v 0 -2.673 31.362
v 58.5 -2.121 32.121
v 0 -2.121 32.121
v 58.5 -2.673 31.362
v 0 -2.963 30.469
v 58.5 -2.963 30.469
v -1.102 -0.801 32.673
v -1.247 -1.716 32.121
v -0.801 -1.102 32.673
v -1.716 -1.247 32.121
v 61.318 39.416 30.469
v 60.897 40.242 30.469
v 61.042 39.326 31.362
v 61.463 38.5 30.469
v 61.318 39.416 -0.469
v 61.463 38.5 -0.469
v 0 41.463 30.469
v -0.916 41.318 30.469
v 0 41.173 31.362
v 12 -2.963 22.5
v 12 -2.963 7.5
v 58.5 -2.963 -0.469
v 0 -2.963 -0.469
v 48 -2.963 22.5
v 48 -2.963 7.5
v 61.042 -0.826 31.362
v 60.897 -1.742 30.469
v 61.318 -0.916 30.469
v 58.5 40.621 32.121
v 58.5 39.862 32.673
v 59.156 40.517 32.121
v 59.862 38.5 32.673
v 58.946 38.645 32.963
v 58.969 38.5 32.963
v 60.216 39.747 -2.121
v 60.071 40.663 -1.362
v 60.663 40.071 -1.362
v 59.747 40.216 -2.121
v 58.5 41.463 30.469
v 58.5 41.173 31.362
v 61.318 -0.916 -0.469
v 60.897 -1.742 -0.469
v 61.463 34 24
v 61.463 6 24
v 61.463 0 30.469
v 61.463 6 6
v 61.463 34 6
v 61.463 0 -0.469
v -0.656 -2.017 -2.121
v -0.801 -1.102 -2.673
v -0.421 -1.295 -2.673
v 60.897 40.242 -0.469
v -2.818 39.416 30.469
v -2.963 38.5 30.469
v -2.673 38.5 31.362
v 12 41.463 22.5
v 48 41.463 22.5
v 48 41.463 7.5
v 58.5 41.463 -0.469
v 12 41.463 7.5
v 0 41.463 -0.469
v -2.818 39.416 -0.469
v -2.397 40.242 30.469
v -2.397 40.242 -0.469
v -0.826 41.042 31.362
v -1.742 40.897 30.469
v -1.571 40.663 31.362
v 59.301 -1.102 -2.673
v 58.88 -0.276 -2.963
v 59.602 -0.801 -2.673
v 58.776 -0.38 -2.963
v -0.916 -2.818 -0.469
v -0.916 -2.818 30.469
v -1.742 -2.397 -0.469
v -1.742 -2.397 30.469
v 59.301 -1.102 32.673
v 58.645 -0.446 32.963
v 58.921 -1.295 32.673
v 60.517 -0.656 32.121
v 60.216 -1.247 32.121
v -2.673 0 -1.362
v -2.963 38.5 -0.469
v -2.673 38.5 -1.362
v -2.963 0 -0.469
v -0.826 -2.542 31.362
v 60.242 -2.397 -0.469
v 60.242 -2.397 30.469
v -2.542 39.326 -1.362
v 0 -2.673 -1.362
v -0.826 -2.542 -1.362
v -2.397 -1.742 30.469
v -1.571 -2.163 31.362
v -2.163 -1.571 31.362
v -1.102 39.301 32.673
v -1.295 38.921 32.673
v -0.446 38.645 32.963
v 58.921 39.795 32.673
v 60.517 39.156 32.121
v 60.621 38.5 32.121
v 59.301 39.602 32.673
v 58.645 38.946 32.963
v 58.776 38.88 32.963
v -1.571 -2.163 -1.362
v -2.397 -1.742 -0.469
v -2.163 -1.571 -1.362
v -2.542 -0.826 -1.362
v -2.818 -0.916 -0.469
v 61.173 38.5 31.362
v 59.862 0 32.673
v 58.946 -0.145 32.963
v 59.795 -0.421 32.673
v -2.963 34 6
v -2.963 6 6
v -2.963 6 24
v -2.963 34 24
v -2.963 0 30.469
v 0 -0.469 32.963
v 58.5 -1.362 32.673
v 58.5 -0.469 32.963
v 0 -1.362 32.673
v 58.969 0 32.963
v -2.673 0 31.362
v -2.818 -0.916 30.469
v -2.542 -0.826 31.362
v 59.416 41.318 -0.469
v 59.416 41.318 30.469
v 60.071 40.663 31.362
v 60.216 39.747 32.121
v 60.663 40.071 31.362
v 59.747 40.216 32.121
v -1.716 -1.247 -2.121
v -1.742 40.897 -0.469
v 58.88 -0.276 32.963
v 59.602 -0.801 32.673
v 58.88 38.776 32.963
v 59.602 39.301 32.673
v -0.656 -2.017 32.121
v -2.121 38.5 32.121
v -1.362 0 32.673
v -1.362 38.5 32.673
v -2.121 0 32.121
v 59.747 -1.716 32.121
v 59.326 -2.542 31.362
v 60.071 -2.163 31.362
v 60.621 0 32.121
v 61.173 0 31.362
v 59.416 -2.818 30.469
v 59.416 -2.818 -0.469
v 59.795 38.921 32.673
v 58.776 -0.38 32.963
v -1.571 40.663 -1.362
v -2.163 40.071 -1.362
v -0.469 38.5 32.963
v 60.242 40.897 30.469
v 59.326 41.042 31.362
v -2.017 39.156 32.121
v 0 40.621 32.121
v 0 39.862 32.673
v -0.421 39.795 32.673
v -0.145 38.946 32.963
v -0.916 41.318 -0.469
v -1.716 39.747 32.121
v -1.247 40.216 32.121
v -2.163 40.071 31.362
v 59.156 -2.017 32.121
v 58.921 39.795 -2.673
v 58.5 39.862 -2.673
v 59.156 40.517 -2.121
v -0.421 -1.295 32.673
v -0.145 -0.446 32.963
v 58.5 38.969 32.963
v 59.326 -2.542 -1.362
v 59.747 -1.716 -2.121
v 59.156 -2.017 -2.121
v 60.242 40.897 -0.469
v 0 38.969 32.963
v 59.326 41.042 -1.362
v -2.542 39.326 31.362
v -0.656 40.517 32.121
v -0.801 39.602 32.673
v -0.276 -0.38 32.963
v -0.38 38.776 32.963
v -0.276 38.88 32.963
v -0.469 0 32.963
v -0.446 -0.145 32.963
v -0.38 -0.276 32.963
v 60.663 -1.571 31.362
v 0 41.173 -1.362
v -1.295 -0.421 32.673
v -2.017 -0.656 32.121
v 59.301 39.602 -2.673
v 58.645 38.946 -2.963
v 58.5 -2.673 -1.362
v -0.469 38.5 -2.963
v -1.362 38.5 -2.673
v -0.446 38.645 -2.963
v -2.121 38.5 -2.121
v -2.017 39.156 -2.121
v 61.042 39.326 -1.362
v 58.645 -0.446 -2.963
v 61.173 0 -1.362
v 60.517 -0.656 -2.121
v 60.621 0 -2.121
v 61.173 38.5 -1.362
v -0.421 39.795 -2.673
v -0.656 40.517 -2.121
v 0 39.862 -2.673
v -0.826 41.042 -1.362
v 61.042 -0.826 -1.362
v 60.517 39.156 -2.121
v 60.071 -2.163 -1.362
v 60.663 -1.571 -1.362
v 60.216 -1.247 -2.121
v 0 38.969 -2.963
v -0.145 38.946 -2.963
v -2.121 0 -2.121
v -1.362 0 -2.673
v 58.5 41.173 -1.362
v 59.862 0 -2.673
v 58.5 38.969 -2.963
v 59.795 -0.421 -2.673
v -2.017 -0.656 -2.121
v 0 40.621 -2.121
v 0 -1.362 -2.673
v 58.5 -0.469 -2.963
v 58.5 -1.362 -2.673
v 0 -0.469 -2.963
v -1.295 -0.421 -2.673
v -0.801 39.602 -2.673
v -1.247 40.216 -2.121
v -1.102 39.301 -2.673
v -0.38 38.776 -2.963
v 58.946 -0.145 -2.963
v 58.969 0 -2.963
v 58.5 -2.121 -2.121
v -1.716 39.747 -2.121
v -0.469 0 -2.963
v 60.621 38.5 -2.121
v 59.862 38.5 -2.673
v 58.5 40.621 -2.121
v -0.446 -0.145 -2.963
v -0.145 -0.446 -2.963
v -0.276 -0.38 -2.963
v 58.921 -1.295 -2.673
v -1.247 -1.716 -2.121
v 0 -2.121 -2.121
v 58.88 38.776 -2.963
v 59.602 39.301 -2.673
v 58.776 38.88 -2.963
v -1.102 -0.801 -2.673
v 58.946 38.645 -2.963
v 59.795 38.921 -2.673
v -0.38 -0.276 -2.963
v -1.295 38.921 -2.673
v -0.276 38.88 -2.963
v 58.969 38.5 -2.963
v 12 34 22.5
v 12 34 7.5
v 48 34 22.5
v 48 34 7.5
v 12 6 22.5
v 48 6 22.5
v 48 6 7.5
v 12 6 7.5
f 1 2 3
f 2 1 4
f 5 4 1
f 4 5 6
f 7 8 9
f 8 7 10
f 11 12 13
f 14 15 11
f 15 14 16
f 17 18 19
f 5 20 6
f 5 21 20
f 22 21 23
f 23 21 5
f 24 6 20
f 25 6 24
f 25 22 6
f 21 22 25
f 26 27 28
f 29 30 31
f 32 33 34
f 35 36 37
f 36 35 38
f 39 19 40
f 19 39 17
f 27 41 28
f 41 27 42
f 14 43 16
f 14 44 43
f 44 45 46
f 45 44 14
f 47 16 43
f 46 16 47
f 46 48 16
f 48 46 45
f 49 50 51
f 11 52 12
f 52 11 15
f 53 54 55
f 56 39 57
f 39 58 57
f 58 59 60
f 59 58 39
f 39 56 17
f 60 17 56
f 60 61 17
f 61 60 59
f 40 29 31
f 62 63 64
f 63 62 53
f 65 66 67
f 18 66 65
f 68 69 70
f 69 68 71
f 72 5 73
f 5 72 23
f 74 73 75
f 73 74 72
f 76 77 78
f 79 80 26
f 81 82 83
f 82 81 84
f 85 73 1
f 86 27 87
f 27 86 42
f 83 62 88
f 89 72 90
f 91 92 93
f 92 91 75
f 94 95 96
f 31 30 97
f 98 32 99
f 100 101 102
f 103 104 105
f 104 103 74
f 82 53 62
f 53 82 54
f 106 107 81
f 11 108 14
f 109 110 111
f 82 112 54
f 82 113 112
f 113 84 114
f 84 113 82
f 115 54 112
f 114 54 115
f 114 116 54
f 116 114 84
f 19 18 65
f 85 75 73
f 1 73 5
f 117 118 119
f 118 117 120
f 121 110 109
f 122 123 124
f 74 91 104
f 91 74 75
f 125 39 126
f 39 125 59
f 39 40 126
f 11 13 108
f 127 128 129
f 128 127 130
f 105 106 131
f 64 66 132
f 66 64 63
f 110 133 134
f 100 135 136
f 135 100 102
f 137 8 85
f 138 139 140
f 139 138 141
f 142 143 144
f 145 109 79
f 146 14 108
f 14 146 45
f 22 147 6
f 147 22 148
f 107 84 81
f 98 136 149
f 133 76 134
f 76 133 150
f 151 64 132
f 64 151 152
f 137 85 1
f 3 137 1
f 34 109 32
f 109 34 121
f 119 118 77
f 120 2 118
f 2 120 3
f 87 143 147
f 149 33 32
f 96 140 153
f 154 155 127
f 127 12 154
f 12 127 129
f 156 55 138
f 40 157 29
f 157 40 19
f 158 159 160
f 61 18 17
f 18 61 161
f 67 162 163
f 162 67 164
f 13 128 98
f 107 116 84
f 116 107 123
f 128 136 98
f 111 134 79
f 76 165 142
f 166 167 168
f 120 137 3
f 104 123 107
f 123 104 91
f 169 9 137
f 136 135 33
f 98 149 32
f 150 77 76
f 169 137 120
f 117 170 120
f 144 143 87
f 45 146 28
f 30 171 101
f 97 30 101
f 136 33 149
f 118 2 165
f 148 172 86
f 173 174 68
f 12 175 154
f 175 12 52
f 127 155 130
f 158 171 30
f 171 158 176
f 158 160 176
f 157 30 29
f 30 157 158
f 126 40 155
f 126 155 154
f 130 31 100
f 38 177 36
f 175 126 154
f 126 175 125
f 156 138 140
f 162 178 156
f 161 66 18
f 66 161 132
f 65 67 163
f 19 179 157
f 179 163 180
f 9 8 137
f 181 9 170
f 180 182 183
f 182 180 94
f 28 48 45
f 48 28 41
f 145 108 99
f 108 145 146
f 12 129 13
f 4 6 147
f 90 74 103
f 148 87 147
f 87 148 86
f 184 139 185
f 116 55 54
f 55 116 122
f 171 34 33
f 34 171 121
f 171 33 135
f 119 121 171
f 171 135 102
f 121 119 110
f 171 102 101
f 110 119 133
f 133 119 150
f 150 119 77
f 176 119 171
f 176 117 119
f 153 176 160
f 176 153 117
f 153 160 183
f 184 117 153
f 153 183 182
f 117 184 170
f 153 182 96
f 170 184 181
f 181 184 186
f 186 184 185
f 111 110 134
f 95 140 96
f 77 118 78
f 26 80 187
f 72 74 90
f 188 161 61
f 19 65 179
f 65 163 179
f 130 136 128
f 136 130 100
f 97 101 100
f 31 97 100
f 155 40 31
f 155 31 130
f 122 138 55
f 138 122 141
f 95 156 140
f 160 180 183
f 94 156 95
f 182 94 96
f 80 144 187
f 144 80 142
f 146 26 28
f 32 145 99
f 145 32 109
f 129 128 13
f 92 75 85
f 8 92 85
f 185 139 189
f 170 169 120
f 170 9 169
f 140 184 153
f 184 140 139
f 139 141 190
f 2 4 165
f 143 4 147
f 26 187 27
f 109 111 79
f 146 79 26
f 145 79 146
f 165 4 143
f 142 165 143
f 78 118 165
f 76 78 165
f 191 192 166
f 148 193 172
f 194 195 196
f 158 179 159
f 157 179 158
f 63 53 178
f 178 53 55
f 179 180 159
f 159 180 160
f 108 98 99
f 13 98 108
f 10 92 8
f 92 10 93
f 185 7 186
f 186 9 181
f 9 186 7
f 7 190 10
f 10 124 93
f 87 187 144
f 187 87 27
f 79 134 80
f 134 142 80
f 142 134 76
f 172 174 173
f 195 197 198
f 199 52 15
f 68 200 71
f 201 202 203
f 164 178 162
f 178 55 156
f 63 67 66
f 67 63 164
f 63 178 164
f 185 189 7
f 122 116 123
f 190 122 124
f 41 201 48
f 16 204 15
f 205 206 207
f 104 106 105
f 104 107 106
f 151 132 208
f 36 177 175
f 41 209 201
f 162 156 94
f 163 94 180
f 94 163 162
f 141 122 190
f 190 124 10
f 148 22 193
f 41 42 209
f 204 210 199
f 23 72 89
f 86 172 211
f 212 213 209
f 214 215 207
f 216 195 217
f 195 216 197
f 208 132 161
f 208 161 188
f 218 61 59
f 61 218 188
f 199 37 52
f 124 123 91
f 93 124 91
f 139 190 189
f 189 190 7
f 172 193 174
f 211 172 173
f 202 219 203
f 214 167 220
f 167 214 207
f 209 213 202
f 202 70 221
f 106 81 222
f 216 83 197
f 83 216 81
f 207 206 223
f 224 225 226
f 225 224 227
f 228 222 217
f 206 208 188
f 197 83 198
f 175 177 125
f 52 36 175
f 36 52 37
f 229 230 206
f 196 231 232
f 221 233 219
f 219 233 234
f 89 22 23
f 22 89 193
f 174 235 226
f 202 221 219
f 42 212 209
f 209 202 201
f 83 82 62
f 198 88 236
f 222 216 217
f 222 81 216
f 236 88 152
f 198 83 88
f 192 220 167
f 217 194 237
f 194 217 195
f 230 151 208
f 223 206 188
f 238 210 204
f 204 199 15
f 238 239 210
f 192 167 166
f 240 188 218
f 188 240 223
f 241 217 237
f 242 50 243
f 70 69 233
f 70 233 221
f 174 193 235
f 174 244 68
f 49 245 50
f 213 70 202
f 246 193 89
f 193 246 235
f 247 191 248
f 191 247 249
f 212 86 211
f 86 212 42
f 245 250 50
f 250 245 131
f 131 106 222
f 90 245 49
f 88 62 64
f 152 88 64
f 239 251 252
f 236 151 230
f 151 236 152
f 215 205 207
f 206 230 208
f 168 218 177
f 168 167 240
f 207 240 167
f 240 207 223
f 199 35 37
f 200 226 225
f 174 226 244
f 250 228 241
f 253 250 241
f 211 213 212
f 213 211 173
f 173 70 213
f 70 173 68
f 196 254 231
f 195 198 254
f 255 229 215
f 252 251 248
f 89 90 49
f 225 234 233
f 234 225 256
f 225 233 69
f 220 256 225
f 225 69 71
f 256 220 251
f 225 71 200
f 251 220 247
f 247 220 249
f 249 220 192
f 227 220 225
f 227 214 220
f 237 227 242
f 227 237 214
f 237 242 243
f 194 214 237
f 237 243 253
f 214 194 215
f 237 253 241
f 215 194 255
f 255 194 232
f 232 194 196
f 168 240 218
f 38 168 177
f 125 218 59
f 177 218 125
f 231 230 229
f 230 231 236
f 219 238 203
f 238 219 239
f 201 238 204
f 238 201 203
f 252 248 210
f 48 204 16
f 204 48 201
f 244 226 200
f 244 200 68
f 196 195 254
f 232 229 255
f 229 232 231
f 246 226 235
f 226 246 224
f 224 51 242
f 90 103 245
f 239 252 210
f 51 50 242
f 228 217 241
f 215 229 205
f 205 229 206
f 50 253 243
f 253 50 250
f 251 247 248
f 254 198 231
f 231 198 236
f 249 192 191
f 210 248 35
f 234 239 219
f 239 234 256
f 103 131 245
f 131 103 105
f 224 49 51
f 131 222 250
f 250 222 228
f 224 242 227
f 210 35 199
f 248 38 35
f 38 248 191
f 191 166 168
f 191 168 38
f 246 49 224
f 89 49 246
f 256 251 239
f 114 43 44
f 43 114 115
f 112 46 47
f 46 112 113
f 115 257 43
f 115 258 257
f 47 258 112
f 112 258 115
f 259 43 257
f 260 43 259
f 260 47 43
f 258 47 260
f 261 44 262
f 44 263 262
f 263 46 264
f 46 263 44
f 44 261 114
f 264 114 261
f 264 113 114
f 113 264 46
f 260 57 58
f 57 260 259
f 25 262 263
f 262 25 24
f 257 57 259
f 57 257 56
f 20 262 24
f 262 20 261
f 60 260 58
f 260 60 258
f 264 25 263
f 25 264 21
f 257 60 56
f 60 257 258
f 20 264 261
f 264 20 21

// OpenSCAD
// file: ../../../rounded-cube/rounded-cube.scad
/**
 *
 *  some parts of this software were inspired by
 *
 * 	     http://www.thingiverse.com/thing:9347
 *
 */

/**
 * makes a rounded cube
 */
module roundedCube(cornerRadius=4,
				   cubeCentered=false,
				   sides=30,
				   sidesOnly=false,
				   size=[20,20,2])
{
    $fn=sides;

    x = size[0] - cornerRadius/2;
    y = size[1] - cornerRadius/2;
    z = size[2];

    minkowski(size, cornerRadius)
    {
        cube(size=[x,y,z], center=cubeCentered);

        if(sidesOnly)
        {
            cylinder(r=cornerRadius);
        }
        else
        {
            sphere(r=cornerRadius);
        }
    };
}
// file: ../../rounded-cube-enclosure.scad
use <../rounded-cube/rounded-cube.scad>

module roundedCubeEnclosure(boardLengthX,
					 		boardLengthY,
					 		boardLengthZ,
							cornerRadius,
							xAxisCutout_yPercentage,
							xAxisCutout_zPercentage,
							yAxisCutout_xPercentage,
							yAxisCutout_zPercentage)
{
	size = [boardLengthX, boardLengthY, boardLengthZ];

	difference()
	{
		roundedCube(cornerRadius = cornerRadius,
					size=size,
		            sides=5,
		            sides=20);

		// x axis cutout
		xAxisCutout_xLength = boardLengthX * 1.2;
		xAxisCutout_yLength = boardLengthY * xAxisCutout_yPercentage;
		xAxisCutout_zLength = boardLengthZ * xAxisCutout_zPercentage;
		xAxisCutout_xTranslate = -0.09 * boardLengthX;
		xAxisCutout_yTranslate = boardLengthY / 2.0 - xAxisCutout_yLength / 2.0;
		xAxisCutout_zTranslate = boardLengthZ / 2.0 - xAxisCutout_zLength / 2.0;
		color("blue")
		translate([xAxisCutout_xTranslate,
				   xAxisCutout_yTranslate,
				   xAxisCutout_zTranslate])
		cube([xAxisCutout_xLength,
			  xAxisCutout_yLength,
			  xAxisCutout_zLength]);

	  	// y axis cutout
		yAxisCutout_xLength = boardLengthX * yAxisCutout_xPercentage;
		yAxisCutout_yLength = boardLengthY * 1.2;
		yAxisCutout_zLength = boardLengthZ * yAxisCutout_zPercentage;
		yAxisCutout_xTranslate = boardLengthX / 2.0 - yAxisCutout_xLength / 2.0;
		yAxisCutout_yTranslate = boardLengthY / 2.0 - yAxisCutout_yLength / 2.0;
		yAxisCutout_zTranslate = boardLengthZ / 2.0 - yAxisCutout_zLength / 2.0;
		color("green")
		translate([yAxisCutout_xTranslate,
				   yAxisCutout_yTranslate,
				   yAxisCutout_zTranslate])
		cube([yAxisCutout_xLength,
			  yAxisCutout_yLength,
			  yAxisCutout_zLength]);
	}
}
// main file
use <../../rounded-cube-enclosure.scad>

roundedCubeEnclosure(boardLengthX = 60,
                    boardLengthY = 40,
                    boardLengthZ = 30,
                    cornerRadius = 3,
                    xAxisCutout_yPercentage = 0.7,
                    xAxisCutout_zPercentage = 0.6,
                    yAxisCutout_xPercentage = 0.6,
                    yAxisCutout_zPercentage = 0.5);
